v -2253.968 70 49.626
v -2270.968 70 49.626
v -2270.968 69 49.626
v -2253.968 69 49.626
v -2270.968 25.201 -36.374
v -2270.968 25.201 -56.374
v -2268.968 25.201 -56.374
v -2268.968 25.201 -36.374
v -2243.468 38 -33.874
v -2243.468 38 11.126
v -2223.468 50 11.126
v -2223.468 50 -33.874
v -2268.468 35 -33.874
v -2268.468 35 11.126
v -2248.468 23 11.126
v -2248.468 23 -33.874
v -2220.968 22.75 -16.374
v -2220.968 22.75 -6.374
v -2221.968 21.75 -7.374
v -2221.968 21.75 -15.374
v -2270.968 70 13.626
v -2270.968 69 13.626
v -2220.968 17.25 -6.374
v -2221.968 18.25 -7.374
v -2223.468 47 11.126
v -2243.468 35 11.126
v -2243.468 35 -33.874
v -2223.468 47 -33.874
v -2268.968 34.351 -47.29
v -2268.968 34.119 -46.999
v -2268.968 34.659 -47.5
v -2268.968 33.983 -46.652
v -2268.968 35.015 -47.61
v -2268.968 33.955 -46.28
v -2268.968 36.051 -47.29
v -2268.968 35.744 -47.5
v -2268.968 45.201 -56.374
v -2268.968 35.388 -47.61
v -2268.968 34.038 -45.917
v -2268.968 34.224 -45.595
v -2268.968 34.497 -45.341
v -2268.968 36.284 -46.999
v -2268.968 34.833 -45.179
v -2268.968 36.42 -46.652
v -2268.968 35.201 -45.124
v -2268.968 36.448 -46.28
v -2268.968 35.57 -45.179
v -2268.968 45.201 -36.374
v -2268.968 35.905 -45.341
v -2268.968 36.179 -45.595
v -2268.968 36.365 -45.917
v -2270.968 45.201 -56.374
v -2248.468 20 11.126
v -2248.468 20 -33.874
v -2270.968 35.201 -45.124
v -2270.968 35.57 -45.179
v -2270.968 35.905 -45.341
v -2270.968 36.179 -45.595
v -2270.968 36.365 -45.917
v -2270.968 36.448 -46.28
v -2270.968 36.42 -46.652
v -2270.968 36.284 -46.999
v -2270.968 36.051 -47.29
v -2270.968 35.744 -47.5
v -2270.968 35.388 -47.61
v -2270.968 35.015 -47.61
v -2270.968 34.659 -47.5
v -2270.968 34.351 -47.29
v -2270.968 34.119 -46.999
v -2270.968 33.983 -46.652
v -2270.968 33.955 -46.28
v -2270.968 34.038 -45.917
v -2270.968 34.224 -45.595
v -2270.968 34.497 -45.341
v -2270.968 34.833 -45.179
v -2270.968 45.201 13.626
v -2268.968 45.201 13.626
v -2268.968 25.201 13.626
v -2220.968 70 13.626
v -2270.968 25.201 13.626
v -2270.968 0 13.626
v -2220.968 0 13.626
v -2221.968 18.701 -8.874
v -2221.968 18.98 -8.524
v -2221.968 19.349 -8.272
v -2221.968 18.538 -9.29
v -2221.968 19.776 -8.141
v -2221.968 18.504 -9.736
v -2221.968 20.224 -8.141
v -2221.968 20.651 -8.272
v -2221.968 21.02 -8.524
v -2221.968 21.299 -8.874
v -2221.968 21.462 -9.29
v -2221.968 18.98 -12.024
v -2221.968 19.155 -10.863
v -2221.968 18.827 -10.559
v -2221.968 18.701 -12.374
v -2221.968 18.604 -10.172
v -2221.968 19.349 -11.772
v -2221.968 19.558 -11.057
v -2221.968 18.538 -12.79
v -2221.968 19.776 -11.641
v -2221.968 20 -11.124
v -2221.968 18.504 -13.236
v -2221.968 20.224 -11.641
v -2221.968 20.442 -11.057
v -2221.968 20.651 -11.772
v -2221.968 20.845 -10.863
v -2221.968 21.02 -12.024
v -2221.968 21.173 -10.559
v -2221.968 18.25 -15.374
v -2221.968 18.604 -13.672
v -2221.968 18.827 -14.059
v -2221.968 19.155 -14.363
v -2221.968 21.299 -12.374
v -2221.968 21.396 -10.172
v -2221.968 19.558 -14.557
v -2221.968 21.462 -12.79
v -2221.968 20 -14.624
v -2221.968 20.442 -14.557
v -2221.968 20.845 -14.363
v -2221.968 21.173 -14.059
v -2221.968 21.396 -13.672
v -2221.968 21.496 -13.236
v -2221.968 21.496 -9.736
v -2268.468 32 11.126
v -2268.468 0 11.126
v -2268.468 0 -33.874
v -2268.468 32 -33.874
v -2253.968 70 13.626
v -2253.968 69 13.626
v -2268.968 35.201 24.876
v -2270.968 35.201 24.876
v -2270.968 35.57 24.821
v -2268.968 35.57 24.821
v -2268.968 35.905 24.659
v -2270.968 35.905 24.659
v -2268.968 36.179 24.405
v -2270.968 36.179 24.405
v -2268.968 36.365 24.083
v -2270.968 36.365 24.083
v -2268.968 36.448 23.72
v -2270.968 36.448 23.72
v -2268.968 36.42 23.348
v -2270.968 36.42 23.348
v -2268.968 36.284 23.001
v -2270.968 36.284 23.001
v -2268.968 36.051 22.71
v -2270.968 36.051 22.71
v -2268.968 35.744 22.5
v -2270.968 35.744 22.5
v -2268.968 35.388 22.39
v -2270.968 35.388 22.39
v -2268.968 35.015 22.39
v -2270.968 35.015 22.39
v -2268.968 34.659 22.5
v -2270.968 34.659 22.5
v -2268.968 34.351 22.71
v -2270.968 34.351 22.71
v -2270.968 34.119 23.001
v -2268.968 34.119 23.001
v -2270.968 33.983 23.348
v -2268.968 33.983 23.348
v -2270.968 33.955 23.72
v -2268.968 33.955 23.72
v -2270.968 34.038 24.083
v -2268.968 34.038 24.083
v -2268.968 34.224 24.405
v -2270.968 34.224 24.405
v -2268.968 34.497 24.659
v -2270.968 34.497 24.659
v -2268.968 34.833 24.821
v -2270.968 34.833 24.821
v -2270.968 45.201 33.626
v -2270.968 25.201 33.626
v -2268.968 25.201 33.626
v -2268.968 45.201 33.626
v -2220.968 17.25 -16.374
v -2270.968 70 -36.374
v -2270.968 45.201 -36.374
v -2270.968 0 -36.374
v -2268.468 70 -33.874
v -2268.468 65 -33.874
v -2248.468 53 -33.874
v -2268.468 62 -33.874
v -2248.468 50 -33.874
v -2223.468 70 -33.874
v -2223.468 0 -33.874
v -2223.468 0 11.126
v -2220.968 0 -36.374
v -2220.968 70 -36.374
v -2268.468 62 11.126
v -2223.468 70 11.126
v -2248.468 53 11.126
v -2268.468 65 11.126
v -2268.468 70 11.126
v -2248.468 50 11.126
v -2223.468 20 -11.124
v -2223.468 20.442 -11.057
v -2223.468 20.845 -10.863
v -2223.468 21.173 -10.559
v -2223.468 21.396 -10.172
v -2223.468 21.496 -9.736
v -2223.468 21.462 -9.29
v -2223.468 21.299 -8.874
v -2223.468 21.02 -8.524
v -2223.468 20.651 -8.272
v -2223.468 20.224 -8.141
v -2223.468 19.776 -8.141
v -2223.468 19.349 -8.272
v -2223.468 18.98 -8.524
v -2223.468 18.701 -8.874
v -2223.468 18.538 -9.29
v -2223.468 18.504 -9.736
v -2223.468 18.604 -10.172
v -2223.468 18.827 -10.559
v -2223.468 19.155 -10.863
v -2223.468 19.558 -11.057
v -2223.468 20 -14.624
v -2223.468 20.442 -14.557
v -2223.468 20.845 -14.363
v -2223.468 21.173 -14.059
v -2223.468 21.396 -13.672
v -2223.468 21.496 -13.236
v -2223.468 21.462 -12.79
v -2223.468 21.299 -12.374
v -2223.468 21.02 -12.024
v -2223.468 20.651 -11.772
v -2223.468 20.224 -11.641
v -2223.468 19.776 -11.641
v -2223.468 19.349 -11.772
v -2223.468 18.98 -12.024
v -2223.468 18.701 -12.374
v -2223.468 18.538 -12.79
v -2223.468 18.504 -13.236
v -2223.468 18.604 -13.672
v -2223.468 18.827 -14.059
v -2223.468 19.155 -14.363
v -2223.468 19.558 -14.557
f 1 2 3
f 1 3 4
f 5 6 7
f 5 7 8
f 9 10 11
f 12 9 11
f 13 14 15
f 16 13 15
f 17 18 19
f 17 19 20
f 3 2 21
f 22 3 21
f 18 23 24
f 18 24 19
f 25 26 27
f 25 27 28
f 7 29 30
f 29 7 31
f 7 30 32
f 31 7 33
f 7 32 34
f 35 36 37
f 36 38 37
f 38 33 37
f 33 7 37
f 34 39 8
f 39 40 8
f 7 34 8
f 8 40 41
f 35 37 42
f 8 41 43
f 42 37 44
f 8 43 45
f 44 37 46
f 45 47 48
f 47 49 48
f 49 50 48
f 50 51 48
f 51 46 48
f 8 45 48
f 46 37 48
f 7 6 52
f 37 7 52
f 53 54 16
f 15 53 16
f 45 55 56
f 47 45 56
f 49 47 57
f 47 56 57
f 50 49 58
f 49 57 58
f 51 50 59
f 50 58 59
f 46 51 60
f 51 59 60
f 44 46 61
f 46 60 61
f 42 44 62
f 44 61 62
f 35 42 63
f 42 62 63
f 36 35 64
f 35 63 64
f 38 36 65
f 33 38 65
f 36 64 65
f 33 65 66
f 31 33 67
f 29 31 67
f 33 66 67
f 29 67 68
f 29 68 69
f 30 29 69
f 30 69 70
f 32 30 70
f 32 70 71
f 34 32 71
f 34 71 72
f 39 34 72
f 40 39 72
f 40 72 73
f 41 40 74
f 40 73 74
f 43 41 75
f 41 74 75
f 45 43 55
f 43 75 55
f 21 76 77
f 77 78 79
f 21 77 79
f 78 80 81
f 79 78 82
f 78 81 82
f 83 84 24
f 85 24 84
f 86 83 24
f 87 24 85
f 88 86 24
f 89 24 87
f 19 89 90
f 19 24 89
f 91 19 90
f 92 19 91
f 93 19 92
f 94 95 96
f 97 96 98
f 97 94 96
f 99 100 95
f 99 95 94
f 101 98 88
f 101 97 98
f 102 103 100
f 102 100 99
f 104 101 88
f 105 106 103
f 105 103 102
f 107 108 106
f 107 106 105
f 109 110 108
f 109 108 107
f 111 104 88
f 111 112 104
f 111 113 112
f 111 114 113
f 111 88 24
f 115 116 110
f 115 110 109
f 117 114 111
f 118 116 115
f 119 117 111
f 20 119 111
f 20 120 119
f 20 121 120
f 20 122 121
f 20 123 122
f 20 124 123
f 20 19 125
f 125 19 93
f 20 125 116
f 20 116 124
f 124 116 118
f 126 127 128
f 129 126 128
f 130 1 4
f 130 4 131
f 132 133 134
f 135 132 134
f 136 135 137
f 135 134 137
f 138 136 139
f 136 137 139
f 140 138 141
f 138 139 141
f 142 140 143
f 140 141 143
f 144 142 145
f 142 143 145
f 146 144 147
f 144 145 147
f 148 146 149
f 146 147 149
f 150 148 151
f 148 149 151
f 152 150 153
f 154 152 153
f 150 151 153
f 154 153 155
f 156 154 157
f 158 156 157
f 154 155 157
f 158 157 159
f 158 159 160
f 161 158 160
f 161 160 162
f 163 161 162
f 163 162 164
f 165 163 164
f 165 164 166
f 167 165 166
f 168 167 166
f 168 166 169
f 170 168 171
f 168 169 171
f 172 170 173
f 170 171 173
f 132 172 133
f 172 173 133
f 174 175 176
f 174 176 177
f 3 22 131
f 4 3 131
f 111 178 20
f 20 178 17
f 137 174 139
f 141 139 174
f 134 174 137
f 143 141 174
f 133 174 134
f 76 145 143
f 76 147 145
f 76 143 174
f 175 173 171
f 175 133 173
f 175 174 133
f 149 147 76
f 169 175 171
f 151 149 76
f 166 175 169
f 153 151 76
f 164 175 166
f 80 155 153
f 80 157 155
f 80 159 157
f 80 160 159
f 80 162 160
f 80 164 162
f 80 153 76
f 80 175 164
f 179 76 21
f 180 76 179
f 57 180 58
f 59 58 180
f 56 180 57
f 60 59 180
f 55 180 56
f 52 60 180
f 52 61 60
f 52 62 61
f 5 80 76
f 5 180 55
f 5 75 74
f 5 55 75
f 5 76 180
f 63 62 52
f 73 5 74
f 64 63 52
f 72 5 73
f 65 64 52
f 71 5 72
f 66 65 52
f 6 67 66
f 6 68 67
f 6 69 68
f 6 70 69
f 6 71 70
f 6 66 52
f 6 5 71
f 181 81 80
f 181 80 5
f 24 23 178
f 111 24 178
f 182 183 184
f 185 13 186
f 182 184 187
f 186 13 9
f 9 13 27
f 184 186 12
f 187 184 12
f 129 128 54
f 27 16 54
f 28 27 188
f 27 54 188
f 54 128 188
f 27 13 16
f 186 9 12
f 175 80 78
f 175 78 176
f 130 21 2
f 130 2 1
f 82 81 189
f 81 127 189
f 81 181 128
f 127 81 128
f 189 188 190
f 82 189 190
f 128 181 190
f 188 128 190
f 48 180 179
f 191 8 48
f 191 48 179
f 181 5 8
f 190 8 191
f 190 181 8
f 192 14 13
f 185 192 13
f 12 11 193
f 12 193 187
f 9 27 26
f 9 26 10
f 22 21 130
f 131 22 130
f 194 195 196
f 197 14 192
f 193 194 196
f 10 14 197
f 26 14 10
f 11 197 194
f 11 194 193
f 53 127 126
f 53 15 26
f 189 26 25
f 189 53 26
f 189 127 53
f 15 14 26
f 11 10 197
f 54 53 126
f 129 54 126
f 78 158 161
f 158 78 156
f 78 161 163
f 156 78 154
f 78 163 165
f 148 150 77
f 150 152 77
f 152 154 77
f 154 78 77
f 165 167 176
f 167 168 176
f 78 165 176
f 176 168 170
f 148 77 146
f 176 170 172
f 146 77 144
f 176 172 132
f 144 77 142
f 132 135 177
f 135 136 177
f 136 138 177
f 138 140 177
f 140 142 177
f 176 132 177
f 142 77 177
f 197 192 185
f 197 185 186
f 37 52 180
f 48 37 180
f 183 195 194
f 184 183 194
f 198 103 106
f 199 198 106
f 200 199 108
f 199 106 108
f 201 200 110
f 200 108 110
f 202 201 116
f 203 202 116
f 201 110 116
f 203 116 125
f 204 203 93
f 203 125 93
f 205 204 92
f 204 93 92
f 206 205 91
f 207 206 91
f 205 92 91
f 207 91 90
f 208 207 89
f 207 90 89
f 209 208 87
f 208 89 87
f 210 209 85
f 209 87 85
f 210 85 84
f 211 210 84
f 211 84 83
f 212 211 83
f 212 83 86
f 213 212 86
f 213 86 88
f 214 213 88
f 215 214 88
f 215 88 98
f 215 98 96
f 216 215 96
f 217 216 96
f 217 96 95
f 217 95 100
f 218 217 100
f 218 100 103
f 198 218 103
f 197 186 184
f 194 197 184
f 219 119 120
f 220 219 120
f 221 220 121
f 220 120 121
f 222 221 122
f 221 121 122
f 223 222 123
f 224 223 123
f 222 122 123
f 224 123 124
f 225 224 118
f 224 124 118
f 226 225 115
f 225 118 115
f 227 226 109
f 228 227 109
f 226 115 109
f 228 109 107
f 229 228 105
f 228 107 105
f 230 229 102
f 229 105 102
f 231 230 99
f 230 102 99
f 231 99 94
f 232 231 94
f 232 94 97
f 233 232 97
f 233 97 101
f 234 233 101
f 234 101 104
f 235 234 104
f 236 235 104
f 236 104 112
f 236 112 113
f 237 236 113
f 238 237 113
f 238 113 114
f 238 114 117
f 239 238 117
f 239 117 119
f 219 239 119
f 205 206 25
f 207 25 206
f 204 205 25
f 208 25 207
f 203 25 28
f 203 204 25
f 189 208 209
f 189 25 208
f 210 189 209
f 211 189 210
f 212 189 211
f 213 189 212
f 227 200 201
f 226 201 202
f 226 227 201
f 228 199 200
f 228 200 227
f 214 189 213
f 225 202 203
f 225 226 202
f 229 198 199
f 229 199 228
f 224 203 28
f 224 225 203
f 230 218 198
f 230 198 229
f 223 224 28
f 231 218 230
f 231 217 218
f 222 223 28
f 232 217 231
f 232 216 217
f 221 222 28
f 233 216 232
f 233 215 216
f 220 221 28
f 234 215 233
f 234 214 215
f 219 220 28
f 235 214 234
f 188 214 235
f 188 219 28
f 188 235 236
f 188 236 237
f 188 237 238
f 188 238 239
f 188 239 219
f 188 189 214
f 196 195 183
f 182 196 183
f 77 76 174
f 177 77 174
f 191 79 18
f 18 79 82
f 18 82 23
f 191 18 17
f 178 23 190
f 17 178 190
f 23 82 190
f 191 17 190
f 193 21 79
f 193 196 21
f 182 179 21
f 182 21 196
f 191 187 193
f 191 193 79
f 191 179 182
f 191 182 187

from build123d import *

# Parameters (mm, degrees)
CROQUIS2_W              = 50
CROQUIS2_H              = 50
CROQUIS2_W_2            = 45
CROQUIS2_H_2            = 45
SALIENTE_EXTRUIR1_DEPTH = 70
CROQUIS3_W              = 20
CROQUIS3_H              = 15
SALIENTE_EXTRUIR2_DEPTH = 45
CORTAR_EXTRUIR1_DEPTH   = 45
CROQUIS5_W              = 20
CROQUIS5_H              = 15
SALIENTE_EXTRUIR3_DEPTH = 45
CORTAR_EXTRUIR2_DEPTH   = 45
CROQUIS7_W              = 20
CROQUIS7_H              = 15
SALIENTE_EXTRUIR4_DEPTH = 45
CORTAR_EXTRUIR3_DEPTH   = 45
CROQUIS10_W             = 17
CROQUIS10_H             = 36
SALIENTE_EXTRUIR6_DEPTH = 1
CROQUIS12_W             = 20
CROQUIS12_H             = 20
CROQUIS12_R             = 1.25
SALIENTE_EXTRUIR7_DEPTH = 2
CROQUIS13_W             = 10
CROQUIS13_H             = 5.5
CORTAR_EXTRUIR4_DEPTH   = 1
CORTAR_EXTRUIR4_DRAFT   = -45
CROQUIS14_R             = 1.5
CORTAR_EXTRUIR5_DEPTH   = 2.5


with BuildPart() as part:
    # Croquis2 → Saliente-Extruir1 (new body)
    with BuildSketch(Plane(origin=(0, 0, 0), x_dir=(1, 0, 0), z_dir=(0, 1, 0))):
        with Locations((-2245.968468468, 11.373873874)):
            Rectangle(CROQUIS2_W, CROQUIS2_H)
        with Locations((-2245.968468468, 11.373873874)):
            Rectangle(CROQUIS2_W_2, CROQUIS2_H_2, mode=Mode.SUBTRACT)
    extrude(amount=SALIENTE_EXTRUIR1_DEPTH)

    # Croquis3 → Saliente-Extruir2 (add)
    with BuildSketch(Plane(origin=(0, 0, 11.126126126), x_dir=(-1, 0, 0), z_dir=(0, 0, -1))):
        with Locations((2258.468468468, 57.5)):
            Rectangle(CROQUIS3_W, CROQUIS3_H)
    extrude(amount=SALIENTE_EXTRUIR2_DEPTH)

    # Croquis4 → Cortar-Extruir1 (cut)
    with BuildSketch(Plane(origin=(0, 0, 11.126126126), x_dir=(-1, 0, 0), z_dir=(0, 0, -1))):
        Polygon((2248.468468468, 65), (2268.468468468, 65), (2248.468468468, 53), align=None)
        Polygon((2248.468468468, 50), (2268.468468468, 50), (2268.468468468, 62), align=None)
    extrude(amount=CORTAR_EXTRUIR1_DEPTH, mode=Mode.SUBTRACT)

    # Croquis5 → Saliente-Extruir3 (add)
    with BuildSketch(Plane(origin=(0, 0, 11.126126126), x_dir=(-1, 0, 0), z_dir=(0, 0, -1))):
        with Locations((2233.468468468, 42.5)):
            Rectangle(CROQUIS5_W, CROQUIS5_H)
    extrude(amount=SALIENTE_EXTRUIR3_DEPTH)

    # Croquis6 → Cortar-Extruir2 (cut)
    with BuildSketch(Plane(origin=(0, 0, 11.126126126), x_dir=(-1, 0, 0), z_dir=(0, 0, -1))):
        Polygon((2223.468468468, 50), (2243.468468468, 50), (2243.468468468, 38), align=None)
        Polygon((2223.468468468, 35), (2243.468468468, 35), (2223.468468468, 47), align=None)
    extrude(amount=CORTAR_EXTRUIR2_DEPTH, mode=Mode.SUBTRACT)

    # Croquis7 → Saliente-Extruir4 (add)
    with BuildSketch(Plane(origin=(0, 0, 11.126126126), x_dir=(-1, 0, 0), z_dir=(0, 0, -1))):
        with Locations((2258.468468468, 27.5)):
            Rectangle(CROQUIS7_W, CROQUIS7_H)
    extrude(amount=SALIENTE_EXTRUIR4_DEPTH)

    # Croquis8 → Cortar-Extruir3 (cut)
    with BuildSketch(Plane(origin=(0, 0, 11.126126126), x_dir=(-1, 0, 0), z_dir=(0, 0, -1))):
        Polygon((2248.468468468, 35), (2268.468468468, 35), (2248.468468468, 23), align=None)
        Polygon((2268.468468468, 20), (2248.468468468, 20), (2268.468468468, 32), align=None)
    extrude(amount=CORTAR_EXTRUIR3_DEPTH, mode=Mode.SUBTRACT)

    # Croquis12 → Saliente-Extruir7 (add)
    # profile 1 of 2: a face of its own
    with BuildSketch(Plane.ZY.offset(2270.968468468)):
        with Locations((-46.373873874, 35.201264481)):
            Rectangle(CROQUIS12_W, CROQUIS12_H)
        with Locations((-46.373873874, 35.201264481)):
            Circle(CROQUIS12_R, mode=Mode.SUBTRACT)
    # profile 2 of 2: a face of its own
    with BuildSketch(Plane.ZY.offset(2270.968468468)):
        with Locations((23.626126126, 35.201264481)):
            Rectangle(CROQUIS12_W, CROQUIS12_H)
        with Locations((23.626126126, 35.201264481)):
            Circle(CROQUIS12_R, mode=Mode.SUBTRACT)
    extrude(amount=-SALIENTE_EXTRUIR7_DEPTH)


with BuildPart() as body_2:
    # Croquis10 → Saliente-Extruir6 (new body)
    with BuildSketch(Plane(origin=(0, 70, 0), x_dir=(1, 0, 0), z_dir=(0, 1, 0))):
        with Locations((-2262.468468468, -31.626126126)):
            Rectangle(CROQUIS10_W, CROQUIS10_H)
    extrude(amount=-SALIENTE_EXTRUIR6_DEPTH)


with BuildPart() as cortar_extruir4_tool:
    # Croquis13 → Cortar-Extruir4 (with draft: the straight prism first)
    with BuildSketch(Plane(origin=(-2220.968468468, 0, 0), x_dir=(0, 0, -1), z_dir=(1, 0, 0))):
        with Locations((11.373873874, 20)):
            Rectangle(CROQUIS13_W, CROQUIS13_H)
    extrude(amount=-CORTAR_EXTRUIR4_DEPTH)
    # Cortar-Extruir4: the draft: its side faces are tilted about the plane it starts from
    cortar_extruir4_sides = [cortar_extruir4_tool.faces().sort_by_distance(p)[0] for p in [
        (-2221.468468468, 20, -6.373873874),
        (-2221.468468468, 17.25, -11.373873874),
        (-2221.468468468, 20, -16.373873874),
        (-2221.468468468, 22.75, -11.373873874),
    ]]
    draft(cortar_extruir4_sides, Plane(origin=(-2220.968468468, 0, 0), x_dir=(0, 0, -1), z_dir=(1, 0, 0)), CORTAR_EXTRUIR4_DRAFT)


with BuildPart() as part_1:
    add(part.part)

    # Cortar-Extruir4: cut by cortar_extruir4_tool
    add(cortar_extruir4_tool.part, mode=Mode.SUBTRACT)

    # Croquis14 → Cortar-Extruir5 (cut)
    with BuildSketch(Plane(origin=(-2220.968468468, 0, 0), x_dir=(0, 0, -1), z_dir=(1, 0, 0))):
        with Locations((9.623873874, 20)):
            Circle(CROQUIS14_R)
        with Locations((13.123873874, 20)):
            Circle(CROQUIS14_R)
    extrude(amount=-CORTAR_EXTRUIR5_DEPTH, mode=Mode.SUBTRACT)


solid = Compound([body_2.part, part_1.part])
